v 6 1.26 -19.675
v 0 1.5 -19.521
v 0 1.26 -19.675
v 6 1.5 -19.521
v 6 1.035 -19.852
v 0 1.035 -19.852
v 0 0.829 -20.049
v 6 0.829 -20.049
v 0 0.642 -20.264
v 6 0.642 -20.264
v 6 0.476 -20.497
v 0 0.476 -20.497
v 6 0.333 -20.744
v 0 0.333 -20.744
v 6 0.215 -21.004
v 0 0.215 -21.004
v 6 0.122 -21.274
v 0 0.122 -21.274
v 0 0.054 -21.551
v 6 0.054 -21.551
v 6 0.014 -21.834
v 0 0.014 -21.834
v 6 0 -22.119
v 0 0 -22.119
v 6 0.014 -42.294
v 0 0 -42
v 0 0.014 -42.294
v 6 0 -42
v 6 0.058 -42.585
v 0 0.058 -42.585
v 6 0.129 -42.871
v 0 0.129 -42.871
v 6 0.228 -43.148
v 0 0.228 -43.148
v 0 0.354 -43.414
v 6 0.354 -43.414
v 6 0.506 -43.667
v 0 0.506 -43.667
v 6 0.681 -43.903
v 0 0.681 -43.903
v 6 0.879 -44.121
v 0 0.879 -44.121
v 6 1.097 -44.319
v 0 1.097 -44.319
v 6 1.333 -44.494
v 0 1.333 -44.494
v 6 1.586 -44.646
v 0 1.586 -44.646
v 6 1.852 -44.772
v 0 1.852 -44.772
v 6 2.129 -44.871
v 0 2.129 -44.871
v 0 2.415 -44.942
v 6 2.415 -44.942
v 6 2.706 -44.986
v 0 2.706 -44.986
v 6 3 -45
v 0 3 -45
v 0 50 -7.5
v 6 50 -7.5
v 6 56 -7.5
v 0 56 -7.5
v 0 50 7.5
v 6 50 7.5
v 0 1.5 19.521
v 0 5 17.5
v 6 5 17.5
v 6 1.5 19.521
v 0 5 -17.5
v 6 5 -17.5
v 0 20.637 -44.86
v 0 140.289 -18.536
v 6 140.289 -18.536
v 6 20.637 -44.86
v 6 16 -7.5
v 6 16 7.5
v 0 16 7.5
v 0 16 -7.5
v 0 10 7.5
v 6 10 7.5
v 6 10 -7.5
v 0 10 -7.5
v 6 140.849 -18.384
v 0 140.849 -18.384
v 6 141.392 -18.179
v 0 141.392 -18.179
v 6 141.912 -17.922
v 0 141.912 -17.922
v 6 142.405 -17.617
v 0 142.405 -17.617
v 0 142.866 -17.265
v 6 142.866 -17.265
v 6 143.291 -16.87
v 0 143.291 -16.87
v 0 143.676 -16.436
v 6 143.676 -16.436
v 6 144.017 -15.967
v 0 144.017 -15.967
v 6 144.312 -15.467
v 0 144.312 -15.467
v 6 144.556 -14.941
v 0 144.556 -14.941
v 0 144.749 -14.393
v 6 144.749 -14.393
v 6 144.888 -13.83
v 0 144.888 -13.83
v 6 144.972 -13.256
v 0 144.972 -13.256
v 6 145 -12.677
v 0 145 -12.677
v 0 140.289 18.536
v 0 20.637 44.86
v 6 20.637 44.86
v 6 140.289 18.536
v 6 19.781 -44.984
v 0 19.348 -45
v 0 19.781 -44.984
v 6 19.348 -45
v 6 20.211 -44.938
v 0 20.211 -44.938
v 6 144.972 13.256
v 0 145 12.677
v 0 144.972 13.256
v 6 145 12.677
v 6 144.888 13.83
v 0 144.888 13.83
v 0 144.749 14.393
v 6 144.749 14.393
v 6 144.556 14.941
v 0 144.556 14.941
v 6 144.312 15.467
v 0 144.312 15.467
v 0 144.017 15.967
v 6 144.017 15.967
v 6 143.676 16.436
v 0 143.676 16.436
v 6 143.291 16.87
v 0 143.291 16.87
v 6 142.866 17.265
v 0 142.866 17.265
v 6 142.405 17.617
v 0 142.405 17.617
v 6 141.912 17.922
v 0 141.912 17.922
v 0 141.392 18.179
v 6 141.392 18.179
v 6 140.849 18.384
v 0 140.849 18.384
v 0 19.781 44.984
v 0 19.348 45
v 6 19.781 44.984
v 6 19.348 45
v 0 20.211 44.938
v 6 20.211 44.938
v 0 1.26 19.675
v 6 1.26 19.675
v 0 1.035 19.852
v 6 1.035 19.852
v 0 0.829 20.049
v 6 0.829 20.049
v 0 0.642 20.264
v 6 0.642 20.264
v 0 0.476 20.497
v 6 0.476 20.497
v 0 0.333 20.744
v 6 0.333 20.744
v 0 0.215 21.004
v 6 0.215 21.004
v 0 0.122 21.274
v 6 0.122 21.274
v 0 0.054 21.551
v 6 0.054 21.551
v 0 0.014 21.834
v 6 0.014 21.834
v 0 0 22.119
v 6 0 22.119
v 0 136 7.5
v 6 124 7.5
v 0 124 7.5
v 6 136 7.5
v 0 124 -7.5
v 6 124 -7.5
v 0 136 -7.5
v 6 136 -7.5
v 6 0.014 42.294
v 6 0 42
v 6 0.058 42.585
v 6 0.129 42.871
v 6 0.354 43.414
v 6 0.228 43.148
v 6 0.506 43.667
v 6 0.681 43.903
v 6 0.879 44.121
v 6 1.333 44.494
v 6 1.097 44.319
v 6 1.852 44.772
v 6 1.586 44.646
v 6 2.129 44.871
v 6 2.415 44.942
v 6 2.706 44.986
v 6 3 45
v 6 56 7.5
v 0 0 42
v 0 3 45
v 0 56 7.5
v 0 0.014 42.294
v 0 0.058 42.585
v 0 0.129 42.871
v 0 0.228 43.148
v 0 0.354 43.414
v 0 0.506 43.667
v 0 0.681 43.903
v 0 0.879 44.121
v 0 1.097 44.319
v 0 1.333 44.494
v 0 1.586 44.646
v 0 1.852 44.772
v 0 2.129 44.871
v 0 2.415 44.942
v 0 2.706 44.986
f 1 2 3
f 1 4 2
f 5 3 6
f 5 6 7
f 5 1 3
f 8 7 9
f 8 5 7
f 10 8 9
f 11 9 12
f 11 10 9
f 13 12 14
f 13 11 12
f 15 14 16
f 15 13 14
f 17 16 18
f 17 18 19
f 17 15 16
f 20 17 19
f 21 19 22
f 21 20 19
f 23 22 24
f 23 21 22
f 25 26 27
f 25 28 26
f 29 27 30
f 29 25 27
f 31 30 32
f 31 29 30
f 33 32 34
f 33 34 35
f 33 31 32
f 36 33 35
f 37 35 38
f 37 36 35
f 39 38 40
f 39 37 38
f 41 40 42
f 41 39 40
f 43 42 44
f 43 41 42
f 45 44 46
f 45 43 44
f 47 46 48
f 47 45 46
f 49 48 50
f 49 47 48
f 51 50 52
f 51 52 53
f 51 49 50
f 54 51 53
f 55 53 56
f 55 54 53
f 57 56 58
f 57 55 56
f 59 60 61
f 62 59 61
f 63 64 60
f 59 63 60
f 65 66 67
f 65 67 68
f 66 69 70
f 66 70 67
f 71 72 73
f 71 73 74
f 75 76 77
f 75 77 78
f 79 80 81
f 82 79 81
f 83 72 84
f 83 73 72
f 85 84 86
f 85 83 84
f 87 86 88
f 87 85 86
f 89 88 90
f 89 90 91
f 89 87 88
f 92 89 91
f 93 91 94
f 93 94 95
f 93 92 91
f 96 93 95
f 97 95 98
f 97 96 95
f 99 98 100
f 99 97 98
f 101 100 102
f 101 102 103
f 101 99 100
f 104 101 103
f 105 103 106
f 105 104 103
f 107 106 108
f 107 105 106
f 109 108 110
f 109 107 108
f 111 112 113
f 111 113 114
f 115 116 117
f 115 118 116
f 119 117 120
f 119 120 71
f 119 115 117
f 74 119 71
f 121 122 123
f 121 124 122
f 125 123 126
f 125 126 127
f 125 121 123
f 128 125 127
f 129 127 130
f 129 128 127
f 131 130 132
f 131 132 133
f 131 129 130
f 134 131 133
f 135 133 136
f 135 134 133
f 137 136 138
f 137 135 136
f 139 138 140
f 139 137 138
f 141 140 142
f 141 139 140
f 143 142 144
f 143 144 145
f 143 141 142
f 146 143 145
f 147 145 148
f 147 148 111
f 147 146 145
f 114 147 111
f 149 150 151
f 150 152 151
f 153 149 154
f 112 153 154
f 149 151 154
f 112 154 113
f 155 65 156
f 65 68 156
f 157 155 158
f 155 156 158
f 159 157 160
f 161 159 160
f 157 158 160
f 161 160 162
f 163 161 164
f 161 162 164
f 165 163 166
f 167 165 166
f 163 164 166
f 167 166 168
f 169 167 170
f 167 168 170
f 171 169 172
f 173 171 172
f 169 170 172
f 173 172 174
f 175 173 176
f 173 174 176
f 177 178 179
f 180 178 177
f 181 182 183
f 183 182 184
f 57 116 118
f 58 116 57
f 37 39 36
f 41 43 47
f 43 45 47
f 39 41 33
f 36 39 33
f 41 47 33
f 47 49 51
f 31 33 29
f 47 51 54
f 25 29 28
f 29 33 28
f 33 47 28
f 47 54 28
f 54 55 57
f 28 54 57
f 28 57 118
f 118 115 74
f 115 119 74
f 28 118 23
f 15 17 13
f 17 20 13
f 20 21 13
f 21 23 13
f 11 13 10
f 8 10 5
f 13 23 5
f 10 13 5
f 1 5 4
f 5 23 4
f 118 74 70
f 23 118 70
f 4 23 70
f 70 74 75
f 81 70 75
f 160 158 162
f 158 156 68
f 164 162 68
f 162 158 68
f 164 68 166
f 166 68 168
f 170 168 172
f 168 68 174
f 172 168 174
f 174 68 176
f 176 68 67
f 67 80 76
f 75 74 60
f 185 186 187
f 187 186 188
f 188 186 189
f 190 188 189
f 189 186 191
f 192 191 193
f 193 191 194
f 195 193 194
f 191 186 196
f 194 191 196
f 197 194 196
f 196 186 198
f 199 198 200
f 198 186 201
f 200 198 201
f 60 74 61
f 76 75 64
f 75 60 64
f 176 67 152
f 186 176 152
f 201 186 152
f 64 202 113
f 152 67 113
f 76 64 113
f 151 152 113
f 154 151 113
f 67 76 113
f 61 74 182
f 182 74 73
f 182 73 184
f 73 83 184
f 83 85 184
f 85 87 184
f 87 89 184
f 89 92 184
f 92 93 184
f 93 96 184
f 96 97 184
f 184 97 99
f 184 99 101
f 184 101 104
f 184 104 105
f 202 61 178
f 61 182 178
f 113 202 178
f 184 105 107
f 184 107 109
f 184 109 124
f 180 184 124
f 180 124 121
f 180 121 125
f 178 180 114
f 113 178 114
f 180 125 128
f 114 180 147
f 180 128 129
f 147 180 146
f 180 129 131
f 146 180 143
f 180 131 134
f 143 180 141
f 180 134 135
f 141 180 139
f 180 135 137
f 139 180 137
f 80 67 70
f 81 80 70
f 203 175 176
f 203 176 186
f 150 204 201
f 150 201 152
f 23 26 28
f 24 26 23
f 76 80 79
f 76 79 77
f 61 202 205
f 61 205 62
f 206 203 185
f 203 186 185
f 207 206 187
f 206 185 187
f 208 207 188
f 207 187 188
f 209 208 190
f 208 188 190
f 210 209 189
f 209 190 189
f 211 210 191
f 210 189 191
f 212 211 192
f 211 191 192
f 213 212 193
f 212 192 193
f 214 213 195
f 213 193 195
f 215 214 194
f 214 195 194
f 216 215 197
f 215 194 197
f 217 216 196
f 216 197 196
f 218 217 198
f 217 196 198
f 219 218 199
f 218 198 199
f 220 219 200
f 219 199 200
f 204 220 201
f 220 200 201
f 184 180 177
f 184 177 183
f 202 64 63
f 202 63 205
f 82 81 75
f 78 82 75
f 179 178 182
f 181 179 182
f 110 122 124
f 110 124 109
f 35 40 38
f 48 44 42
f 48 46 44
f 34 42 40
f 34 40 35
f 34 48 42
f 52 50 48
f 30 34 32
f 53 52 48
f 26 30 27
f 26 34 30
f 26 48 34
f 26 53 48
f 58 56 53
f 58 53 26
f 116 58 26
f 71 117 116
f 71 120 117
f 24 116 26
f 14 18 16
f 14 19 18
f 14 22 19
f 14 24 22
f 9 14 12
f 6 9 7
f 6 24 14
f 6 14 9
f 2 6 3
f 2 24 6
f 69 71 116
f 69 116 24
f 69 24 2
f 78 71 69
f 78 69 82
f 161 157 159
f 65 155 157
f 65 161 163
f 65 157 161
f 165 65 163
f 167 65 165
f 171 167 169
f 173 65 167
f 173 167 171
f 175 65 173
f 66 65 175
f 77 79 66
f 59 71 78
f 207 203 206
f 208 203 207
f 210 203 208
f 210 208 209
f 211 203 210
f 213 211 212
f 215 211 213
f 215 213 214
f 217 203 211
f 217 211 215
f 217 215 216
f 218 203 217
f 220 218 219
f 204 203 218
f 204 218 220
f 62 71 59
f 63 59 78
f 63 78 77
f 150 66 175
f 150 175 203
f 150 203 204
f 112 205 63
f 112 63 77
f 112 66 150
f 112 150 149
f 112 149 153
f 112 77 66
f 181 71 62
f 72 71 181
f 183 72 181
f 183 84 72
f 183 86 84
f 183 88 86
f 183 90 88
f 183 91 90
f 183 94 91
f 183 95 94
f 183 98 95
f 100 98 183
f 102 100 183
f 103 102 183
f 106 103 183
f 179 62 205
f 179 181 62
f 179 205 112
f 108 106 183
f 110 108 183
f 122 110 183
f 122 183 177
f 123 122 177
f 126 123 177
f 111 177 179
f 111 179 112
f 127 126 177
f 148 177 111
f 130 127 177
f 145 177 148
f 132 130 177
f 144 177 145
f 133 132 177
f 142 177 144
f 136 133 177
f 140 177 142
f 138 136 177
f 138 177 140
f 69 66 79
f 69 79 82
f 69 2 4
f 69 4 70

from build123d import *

# Parameters (mm, degrees)
GRUNDPLATTE_DEPTH      = 6
SKIZZE2_W              = 15
SKIZZE2_H              = 12
SKIZZE2_H_2            = 6
ZAPFENDURCHBRUCH_DEPTH = 152.940777937
VERRUNDUNG2_R          = 3
VERRUNDUNG3_R          = 6


with BuildPart() as part:
    # Skizze1 → Grundplatte (new body)
    with BuildSketch(Plane(origin=(0, 0, 0), x_dir=(0, 0, -1), z_dir=(1, 0, 0))):
        Polygon((17.5, 5), (-17.5, 5), (-20.386751346, 0), (-45, 0), (-45, 20), (-17.5, 145), (17.5, 145), (45, 20), (45, 0), (20.386751346, 0), align=None)
    extrude(amount=GRUNDPLATTE_DEPTH)

    # Skizze2 → Zapfendurchbruch (cut, through all)
    with BuildSketch(Plane(origin=(6, 0, 0), x_dir=(0, 0, -1), z_dir=(1, 0, 0))):
        with Locations((0, 130)):
            Rectangle(SKIZZE2_W, SKIZZE2_H)
        with Locations((0, 53)):
            Rectangle(SKIZZE2_W, SKIZZE2_H_2)
        with Locations((0, 13)):
            Rectangle(SKIZZE2_W, SKIZZE2_H_2)
    extrude(amount=-ZAPFENDURCHBRUCH_DEPTH, mode=Mode.SUBTRACT)

    # Verrundung2
    verrundung2_edges = [part.edges().sort_by_distance(p)[0] for p in [
        (3, 0, 20.386751346),
        (3, 0, 45),
        (3, 0, -45),
        (3, 0, -20.386751346),
    ]]
    fillet(verrundung2_edges, radius=VERRUNDUNG2_R)

    # Verrundung3
    verrundung3_edges = [part.edges().sort_by_distance(p)[0] for p in [
        (3, 20, 45),
        (3, 145, 17.5),
        (3, 145, -17.5),
        (3, 20, -45),
    ]]
    fillet(verrundung3_edges, radius=VERRUNDUNG3_R)


solid = part.part
